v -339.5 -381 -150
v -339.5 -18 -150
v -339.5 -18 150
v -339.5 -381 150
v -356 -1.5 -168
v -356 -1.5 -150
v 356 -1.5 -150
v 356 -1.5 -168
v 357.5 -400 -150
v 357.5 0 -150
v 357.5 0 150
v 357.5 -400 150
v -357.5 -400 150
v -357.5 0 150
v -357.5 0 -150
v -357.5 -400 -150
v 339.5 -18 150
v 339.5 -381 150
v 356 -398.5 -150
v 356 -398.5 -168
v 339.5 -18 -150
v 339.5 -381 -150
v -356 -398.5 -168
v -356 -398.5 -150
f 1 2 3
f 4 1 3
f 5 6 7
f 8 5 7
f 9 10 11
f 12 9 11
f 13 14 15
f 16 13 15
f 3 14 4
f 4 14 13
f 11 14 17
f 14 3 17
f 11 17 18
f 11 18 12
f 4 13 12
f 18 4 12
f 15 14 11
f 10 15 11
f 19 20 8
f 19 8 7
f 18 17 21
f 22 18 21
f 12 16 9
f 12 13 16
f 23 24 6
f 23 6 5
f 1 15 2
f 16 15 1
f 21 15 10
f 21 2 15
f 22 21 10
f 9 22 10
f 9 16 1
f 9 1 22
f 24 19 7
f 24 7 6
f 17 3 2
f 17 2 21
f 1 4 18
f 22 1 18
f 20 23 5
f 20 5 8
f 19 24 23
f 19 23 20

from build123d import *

# Parameters (mm, degrees)
F1_DEPTH = 400
F0_W     = 679
F0_H     = 300
F2_DEPTH = 18
F4_W     = 679
F4_H     = 300
F5_DEPTH = 19
F8_DEPTH = 397


with BuildPart() as f1:
    # F0 (on Front) → F1 (new body)
    with BuildSketch(Plane.XZ):
        Polygon((-356, -150), (-339.5, -150), (-339.5, 150), (-357.5, 150), (-357.5, -150), align=None)
    extrude(amount=F1_DEPTH)



with BuildPart() as f1b:
    # F0 (on Front) → F1, piece 2 (new body)
    with BuildSketch(Plane.XZ):
        Polygon((339.5, 150), (339.5, -150), (356, -150), (357.5, -150), (357.5, 150), align=None)
    extrude(amount=F1_DEPTH)


with BuildPart() as f1_1:
    add(f1.part)

    add(f1b.part)  # F2 merges F1b
    # F0 (on Front) → F2 (join)
    with BuildSketch(Plane.XZ):
        Rectangle(F0_W, F0_H)
    extrude(amount=F2_DEPTH)

    # F4 (on offset) → F5 (join)
    with BuildSketch(Plane.XZ.offset(400)):
        Rectangle(F4_W, F4_H)
    extrude(amount=-F5_DEPTH)


with BuildPart() as f8:
    # F7 (on offset) → F8 (new body)
    with BuildSketch(Plane.XZ.offset(398.5)):
        Polygon((339.5, -150), (-339.5, -150), (-356, -150), (-356, -168), (356, -168), (356, -150), align=None)
    extrude(amount=-F8_DEPTH)


solid = Compound([f1_1.part, f8.part])
